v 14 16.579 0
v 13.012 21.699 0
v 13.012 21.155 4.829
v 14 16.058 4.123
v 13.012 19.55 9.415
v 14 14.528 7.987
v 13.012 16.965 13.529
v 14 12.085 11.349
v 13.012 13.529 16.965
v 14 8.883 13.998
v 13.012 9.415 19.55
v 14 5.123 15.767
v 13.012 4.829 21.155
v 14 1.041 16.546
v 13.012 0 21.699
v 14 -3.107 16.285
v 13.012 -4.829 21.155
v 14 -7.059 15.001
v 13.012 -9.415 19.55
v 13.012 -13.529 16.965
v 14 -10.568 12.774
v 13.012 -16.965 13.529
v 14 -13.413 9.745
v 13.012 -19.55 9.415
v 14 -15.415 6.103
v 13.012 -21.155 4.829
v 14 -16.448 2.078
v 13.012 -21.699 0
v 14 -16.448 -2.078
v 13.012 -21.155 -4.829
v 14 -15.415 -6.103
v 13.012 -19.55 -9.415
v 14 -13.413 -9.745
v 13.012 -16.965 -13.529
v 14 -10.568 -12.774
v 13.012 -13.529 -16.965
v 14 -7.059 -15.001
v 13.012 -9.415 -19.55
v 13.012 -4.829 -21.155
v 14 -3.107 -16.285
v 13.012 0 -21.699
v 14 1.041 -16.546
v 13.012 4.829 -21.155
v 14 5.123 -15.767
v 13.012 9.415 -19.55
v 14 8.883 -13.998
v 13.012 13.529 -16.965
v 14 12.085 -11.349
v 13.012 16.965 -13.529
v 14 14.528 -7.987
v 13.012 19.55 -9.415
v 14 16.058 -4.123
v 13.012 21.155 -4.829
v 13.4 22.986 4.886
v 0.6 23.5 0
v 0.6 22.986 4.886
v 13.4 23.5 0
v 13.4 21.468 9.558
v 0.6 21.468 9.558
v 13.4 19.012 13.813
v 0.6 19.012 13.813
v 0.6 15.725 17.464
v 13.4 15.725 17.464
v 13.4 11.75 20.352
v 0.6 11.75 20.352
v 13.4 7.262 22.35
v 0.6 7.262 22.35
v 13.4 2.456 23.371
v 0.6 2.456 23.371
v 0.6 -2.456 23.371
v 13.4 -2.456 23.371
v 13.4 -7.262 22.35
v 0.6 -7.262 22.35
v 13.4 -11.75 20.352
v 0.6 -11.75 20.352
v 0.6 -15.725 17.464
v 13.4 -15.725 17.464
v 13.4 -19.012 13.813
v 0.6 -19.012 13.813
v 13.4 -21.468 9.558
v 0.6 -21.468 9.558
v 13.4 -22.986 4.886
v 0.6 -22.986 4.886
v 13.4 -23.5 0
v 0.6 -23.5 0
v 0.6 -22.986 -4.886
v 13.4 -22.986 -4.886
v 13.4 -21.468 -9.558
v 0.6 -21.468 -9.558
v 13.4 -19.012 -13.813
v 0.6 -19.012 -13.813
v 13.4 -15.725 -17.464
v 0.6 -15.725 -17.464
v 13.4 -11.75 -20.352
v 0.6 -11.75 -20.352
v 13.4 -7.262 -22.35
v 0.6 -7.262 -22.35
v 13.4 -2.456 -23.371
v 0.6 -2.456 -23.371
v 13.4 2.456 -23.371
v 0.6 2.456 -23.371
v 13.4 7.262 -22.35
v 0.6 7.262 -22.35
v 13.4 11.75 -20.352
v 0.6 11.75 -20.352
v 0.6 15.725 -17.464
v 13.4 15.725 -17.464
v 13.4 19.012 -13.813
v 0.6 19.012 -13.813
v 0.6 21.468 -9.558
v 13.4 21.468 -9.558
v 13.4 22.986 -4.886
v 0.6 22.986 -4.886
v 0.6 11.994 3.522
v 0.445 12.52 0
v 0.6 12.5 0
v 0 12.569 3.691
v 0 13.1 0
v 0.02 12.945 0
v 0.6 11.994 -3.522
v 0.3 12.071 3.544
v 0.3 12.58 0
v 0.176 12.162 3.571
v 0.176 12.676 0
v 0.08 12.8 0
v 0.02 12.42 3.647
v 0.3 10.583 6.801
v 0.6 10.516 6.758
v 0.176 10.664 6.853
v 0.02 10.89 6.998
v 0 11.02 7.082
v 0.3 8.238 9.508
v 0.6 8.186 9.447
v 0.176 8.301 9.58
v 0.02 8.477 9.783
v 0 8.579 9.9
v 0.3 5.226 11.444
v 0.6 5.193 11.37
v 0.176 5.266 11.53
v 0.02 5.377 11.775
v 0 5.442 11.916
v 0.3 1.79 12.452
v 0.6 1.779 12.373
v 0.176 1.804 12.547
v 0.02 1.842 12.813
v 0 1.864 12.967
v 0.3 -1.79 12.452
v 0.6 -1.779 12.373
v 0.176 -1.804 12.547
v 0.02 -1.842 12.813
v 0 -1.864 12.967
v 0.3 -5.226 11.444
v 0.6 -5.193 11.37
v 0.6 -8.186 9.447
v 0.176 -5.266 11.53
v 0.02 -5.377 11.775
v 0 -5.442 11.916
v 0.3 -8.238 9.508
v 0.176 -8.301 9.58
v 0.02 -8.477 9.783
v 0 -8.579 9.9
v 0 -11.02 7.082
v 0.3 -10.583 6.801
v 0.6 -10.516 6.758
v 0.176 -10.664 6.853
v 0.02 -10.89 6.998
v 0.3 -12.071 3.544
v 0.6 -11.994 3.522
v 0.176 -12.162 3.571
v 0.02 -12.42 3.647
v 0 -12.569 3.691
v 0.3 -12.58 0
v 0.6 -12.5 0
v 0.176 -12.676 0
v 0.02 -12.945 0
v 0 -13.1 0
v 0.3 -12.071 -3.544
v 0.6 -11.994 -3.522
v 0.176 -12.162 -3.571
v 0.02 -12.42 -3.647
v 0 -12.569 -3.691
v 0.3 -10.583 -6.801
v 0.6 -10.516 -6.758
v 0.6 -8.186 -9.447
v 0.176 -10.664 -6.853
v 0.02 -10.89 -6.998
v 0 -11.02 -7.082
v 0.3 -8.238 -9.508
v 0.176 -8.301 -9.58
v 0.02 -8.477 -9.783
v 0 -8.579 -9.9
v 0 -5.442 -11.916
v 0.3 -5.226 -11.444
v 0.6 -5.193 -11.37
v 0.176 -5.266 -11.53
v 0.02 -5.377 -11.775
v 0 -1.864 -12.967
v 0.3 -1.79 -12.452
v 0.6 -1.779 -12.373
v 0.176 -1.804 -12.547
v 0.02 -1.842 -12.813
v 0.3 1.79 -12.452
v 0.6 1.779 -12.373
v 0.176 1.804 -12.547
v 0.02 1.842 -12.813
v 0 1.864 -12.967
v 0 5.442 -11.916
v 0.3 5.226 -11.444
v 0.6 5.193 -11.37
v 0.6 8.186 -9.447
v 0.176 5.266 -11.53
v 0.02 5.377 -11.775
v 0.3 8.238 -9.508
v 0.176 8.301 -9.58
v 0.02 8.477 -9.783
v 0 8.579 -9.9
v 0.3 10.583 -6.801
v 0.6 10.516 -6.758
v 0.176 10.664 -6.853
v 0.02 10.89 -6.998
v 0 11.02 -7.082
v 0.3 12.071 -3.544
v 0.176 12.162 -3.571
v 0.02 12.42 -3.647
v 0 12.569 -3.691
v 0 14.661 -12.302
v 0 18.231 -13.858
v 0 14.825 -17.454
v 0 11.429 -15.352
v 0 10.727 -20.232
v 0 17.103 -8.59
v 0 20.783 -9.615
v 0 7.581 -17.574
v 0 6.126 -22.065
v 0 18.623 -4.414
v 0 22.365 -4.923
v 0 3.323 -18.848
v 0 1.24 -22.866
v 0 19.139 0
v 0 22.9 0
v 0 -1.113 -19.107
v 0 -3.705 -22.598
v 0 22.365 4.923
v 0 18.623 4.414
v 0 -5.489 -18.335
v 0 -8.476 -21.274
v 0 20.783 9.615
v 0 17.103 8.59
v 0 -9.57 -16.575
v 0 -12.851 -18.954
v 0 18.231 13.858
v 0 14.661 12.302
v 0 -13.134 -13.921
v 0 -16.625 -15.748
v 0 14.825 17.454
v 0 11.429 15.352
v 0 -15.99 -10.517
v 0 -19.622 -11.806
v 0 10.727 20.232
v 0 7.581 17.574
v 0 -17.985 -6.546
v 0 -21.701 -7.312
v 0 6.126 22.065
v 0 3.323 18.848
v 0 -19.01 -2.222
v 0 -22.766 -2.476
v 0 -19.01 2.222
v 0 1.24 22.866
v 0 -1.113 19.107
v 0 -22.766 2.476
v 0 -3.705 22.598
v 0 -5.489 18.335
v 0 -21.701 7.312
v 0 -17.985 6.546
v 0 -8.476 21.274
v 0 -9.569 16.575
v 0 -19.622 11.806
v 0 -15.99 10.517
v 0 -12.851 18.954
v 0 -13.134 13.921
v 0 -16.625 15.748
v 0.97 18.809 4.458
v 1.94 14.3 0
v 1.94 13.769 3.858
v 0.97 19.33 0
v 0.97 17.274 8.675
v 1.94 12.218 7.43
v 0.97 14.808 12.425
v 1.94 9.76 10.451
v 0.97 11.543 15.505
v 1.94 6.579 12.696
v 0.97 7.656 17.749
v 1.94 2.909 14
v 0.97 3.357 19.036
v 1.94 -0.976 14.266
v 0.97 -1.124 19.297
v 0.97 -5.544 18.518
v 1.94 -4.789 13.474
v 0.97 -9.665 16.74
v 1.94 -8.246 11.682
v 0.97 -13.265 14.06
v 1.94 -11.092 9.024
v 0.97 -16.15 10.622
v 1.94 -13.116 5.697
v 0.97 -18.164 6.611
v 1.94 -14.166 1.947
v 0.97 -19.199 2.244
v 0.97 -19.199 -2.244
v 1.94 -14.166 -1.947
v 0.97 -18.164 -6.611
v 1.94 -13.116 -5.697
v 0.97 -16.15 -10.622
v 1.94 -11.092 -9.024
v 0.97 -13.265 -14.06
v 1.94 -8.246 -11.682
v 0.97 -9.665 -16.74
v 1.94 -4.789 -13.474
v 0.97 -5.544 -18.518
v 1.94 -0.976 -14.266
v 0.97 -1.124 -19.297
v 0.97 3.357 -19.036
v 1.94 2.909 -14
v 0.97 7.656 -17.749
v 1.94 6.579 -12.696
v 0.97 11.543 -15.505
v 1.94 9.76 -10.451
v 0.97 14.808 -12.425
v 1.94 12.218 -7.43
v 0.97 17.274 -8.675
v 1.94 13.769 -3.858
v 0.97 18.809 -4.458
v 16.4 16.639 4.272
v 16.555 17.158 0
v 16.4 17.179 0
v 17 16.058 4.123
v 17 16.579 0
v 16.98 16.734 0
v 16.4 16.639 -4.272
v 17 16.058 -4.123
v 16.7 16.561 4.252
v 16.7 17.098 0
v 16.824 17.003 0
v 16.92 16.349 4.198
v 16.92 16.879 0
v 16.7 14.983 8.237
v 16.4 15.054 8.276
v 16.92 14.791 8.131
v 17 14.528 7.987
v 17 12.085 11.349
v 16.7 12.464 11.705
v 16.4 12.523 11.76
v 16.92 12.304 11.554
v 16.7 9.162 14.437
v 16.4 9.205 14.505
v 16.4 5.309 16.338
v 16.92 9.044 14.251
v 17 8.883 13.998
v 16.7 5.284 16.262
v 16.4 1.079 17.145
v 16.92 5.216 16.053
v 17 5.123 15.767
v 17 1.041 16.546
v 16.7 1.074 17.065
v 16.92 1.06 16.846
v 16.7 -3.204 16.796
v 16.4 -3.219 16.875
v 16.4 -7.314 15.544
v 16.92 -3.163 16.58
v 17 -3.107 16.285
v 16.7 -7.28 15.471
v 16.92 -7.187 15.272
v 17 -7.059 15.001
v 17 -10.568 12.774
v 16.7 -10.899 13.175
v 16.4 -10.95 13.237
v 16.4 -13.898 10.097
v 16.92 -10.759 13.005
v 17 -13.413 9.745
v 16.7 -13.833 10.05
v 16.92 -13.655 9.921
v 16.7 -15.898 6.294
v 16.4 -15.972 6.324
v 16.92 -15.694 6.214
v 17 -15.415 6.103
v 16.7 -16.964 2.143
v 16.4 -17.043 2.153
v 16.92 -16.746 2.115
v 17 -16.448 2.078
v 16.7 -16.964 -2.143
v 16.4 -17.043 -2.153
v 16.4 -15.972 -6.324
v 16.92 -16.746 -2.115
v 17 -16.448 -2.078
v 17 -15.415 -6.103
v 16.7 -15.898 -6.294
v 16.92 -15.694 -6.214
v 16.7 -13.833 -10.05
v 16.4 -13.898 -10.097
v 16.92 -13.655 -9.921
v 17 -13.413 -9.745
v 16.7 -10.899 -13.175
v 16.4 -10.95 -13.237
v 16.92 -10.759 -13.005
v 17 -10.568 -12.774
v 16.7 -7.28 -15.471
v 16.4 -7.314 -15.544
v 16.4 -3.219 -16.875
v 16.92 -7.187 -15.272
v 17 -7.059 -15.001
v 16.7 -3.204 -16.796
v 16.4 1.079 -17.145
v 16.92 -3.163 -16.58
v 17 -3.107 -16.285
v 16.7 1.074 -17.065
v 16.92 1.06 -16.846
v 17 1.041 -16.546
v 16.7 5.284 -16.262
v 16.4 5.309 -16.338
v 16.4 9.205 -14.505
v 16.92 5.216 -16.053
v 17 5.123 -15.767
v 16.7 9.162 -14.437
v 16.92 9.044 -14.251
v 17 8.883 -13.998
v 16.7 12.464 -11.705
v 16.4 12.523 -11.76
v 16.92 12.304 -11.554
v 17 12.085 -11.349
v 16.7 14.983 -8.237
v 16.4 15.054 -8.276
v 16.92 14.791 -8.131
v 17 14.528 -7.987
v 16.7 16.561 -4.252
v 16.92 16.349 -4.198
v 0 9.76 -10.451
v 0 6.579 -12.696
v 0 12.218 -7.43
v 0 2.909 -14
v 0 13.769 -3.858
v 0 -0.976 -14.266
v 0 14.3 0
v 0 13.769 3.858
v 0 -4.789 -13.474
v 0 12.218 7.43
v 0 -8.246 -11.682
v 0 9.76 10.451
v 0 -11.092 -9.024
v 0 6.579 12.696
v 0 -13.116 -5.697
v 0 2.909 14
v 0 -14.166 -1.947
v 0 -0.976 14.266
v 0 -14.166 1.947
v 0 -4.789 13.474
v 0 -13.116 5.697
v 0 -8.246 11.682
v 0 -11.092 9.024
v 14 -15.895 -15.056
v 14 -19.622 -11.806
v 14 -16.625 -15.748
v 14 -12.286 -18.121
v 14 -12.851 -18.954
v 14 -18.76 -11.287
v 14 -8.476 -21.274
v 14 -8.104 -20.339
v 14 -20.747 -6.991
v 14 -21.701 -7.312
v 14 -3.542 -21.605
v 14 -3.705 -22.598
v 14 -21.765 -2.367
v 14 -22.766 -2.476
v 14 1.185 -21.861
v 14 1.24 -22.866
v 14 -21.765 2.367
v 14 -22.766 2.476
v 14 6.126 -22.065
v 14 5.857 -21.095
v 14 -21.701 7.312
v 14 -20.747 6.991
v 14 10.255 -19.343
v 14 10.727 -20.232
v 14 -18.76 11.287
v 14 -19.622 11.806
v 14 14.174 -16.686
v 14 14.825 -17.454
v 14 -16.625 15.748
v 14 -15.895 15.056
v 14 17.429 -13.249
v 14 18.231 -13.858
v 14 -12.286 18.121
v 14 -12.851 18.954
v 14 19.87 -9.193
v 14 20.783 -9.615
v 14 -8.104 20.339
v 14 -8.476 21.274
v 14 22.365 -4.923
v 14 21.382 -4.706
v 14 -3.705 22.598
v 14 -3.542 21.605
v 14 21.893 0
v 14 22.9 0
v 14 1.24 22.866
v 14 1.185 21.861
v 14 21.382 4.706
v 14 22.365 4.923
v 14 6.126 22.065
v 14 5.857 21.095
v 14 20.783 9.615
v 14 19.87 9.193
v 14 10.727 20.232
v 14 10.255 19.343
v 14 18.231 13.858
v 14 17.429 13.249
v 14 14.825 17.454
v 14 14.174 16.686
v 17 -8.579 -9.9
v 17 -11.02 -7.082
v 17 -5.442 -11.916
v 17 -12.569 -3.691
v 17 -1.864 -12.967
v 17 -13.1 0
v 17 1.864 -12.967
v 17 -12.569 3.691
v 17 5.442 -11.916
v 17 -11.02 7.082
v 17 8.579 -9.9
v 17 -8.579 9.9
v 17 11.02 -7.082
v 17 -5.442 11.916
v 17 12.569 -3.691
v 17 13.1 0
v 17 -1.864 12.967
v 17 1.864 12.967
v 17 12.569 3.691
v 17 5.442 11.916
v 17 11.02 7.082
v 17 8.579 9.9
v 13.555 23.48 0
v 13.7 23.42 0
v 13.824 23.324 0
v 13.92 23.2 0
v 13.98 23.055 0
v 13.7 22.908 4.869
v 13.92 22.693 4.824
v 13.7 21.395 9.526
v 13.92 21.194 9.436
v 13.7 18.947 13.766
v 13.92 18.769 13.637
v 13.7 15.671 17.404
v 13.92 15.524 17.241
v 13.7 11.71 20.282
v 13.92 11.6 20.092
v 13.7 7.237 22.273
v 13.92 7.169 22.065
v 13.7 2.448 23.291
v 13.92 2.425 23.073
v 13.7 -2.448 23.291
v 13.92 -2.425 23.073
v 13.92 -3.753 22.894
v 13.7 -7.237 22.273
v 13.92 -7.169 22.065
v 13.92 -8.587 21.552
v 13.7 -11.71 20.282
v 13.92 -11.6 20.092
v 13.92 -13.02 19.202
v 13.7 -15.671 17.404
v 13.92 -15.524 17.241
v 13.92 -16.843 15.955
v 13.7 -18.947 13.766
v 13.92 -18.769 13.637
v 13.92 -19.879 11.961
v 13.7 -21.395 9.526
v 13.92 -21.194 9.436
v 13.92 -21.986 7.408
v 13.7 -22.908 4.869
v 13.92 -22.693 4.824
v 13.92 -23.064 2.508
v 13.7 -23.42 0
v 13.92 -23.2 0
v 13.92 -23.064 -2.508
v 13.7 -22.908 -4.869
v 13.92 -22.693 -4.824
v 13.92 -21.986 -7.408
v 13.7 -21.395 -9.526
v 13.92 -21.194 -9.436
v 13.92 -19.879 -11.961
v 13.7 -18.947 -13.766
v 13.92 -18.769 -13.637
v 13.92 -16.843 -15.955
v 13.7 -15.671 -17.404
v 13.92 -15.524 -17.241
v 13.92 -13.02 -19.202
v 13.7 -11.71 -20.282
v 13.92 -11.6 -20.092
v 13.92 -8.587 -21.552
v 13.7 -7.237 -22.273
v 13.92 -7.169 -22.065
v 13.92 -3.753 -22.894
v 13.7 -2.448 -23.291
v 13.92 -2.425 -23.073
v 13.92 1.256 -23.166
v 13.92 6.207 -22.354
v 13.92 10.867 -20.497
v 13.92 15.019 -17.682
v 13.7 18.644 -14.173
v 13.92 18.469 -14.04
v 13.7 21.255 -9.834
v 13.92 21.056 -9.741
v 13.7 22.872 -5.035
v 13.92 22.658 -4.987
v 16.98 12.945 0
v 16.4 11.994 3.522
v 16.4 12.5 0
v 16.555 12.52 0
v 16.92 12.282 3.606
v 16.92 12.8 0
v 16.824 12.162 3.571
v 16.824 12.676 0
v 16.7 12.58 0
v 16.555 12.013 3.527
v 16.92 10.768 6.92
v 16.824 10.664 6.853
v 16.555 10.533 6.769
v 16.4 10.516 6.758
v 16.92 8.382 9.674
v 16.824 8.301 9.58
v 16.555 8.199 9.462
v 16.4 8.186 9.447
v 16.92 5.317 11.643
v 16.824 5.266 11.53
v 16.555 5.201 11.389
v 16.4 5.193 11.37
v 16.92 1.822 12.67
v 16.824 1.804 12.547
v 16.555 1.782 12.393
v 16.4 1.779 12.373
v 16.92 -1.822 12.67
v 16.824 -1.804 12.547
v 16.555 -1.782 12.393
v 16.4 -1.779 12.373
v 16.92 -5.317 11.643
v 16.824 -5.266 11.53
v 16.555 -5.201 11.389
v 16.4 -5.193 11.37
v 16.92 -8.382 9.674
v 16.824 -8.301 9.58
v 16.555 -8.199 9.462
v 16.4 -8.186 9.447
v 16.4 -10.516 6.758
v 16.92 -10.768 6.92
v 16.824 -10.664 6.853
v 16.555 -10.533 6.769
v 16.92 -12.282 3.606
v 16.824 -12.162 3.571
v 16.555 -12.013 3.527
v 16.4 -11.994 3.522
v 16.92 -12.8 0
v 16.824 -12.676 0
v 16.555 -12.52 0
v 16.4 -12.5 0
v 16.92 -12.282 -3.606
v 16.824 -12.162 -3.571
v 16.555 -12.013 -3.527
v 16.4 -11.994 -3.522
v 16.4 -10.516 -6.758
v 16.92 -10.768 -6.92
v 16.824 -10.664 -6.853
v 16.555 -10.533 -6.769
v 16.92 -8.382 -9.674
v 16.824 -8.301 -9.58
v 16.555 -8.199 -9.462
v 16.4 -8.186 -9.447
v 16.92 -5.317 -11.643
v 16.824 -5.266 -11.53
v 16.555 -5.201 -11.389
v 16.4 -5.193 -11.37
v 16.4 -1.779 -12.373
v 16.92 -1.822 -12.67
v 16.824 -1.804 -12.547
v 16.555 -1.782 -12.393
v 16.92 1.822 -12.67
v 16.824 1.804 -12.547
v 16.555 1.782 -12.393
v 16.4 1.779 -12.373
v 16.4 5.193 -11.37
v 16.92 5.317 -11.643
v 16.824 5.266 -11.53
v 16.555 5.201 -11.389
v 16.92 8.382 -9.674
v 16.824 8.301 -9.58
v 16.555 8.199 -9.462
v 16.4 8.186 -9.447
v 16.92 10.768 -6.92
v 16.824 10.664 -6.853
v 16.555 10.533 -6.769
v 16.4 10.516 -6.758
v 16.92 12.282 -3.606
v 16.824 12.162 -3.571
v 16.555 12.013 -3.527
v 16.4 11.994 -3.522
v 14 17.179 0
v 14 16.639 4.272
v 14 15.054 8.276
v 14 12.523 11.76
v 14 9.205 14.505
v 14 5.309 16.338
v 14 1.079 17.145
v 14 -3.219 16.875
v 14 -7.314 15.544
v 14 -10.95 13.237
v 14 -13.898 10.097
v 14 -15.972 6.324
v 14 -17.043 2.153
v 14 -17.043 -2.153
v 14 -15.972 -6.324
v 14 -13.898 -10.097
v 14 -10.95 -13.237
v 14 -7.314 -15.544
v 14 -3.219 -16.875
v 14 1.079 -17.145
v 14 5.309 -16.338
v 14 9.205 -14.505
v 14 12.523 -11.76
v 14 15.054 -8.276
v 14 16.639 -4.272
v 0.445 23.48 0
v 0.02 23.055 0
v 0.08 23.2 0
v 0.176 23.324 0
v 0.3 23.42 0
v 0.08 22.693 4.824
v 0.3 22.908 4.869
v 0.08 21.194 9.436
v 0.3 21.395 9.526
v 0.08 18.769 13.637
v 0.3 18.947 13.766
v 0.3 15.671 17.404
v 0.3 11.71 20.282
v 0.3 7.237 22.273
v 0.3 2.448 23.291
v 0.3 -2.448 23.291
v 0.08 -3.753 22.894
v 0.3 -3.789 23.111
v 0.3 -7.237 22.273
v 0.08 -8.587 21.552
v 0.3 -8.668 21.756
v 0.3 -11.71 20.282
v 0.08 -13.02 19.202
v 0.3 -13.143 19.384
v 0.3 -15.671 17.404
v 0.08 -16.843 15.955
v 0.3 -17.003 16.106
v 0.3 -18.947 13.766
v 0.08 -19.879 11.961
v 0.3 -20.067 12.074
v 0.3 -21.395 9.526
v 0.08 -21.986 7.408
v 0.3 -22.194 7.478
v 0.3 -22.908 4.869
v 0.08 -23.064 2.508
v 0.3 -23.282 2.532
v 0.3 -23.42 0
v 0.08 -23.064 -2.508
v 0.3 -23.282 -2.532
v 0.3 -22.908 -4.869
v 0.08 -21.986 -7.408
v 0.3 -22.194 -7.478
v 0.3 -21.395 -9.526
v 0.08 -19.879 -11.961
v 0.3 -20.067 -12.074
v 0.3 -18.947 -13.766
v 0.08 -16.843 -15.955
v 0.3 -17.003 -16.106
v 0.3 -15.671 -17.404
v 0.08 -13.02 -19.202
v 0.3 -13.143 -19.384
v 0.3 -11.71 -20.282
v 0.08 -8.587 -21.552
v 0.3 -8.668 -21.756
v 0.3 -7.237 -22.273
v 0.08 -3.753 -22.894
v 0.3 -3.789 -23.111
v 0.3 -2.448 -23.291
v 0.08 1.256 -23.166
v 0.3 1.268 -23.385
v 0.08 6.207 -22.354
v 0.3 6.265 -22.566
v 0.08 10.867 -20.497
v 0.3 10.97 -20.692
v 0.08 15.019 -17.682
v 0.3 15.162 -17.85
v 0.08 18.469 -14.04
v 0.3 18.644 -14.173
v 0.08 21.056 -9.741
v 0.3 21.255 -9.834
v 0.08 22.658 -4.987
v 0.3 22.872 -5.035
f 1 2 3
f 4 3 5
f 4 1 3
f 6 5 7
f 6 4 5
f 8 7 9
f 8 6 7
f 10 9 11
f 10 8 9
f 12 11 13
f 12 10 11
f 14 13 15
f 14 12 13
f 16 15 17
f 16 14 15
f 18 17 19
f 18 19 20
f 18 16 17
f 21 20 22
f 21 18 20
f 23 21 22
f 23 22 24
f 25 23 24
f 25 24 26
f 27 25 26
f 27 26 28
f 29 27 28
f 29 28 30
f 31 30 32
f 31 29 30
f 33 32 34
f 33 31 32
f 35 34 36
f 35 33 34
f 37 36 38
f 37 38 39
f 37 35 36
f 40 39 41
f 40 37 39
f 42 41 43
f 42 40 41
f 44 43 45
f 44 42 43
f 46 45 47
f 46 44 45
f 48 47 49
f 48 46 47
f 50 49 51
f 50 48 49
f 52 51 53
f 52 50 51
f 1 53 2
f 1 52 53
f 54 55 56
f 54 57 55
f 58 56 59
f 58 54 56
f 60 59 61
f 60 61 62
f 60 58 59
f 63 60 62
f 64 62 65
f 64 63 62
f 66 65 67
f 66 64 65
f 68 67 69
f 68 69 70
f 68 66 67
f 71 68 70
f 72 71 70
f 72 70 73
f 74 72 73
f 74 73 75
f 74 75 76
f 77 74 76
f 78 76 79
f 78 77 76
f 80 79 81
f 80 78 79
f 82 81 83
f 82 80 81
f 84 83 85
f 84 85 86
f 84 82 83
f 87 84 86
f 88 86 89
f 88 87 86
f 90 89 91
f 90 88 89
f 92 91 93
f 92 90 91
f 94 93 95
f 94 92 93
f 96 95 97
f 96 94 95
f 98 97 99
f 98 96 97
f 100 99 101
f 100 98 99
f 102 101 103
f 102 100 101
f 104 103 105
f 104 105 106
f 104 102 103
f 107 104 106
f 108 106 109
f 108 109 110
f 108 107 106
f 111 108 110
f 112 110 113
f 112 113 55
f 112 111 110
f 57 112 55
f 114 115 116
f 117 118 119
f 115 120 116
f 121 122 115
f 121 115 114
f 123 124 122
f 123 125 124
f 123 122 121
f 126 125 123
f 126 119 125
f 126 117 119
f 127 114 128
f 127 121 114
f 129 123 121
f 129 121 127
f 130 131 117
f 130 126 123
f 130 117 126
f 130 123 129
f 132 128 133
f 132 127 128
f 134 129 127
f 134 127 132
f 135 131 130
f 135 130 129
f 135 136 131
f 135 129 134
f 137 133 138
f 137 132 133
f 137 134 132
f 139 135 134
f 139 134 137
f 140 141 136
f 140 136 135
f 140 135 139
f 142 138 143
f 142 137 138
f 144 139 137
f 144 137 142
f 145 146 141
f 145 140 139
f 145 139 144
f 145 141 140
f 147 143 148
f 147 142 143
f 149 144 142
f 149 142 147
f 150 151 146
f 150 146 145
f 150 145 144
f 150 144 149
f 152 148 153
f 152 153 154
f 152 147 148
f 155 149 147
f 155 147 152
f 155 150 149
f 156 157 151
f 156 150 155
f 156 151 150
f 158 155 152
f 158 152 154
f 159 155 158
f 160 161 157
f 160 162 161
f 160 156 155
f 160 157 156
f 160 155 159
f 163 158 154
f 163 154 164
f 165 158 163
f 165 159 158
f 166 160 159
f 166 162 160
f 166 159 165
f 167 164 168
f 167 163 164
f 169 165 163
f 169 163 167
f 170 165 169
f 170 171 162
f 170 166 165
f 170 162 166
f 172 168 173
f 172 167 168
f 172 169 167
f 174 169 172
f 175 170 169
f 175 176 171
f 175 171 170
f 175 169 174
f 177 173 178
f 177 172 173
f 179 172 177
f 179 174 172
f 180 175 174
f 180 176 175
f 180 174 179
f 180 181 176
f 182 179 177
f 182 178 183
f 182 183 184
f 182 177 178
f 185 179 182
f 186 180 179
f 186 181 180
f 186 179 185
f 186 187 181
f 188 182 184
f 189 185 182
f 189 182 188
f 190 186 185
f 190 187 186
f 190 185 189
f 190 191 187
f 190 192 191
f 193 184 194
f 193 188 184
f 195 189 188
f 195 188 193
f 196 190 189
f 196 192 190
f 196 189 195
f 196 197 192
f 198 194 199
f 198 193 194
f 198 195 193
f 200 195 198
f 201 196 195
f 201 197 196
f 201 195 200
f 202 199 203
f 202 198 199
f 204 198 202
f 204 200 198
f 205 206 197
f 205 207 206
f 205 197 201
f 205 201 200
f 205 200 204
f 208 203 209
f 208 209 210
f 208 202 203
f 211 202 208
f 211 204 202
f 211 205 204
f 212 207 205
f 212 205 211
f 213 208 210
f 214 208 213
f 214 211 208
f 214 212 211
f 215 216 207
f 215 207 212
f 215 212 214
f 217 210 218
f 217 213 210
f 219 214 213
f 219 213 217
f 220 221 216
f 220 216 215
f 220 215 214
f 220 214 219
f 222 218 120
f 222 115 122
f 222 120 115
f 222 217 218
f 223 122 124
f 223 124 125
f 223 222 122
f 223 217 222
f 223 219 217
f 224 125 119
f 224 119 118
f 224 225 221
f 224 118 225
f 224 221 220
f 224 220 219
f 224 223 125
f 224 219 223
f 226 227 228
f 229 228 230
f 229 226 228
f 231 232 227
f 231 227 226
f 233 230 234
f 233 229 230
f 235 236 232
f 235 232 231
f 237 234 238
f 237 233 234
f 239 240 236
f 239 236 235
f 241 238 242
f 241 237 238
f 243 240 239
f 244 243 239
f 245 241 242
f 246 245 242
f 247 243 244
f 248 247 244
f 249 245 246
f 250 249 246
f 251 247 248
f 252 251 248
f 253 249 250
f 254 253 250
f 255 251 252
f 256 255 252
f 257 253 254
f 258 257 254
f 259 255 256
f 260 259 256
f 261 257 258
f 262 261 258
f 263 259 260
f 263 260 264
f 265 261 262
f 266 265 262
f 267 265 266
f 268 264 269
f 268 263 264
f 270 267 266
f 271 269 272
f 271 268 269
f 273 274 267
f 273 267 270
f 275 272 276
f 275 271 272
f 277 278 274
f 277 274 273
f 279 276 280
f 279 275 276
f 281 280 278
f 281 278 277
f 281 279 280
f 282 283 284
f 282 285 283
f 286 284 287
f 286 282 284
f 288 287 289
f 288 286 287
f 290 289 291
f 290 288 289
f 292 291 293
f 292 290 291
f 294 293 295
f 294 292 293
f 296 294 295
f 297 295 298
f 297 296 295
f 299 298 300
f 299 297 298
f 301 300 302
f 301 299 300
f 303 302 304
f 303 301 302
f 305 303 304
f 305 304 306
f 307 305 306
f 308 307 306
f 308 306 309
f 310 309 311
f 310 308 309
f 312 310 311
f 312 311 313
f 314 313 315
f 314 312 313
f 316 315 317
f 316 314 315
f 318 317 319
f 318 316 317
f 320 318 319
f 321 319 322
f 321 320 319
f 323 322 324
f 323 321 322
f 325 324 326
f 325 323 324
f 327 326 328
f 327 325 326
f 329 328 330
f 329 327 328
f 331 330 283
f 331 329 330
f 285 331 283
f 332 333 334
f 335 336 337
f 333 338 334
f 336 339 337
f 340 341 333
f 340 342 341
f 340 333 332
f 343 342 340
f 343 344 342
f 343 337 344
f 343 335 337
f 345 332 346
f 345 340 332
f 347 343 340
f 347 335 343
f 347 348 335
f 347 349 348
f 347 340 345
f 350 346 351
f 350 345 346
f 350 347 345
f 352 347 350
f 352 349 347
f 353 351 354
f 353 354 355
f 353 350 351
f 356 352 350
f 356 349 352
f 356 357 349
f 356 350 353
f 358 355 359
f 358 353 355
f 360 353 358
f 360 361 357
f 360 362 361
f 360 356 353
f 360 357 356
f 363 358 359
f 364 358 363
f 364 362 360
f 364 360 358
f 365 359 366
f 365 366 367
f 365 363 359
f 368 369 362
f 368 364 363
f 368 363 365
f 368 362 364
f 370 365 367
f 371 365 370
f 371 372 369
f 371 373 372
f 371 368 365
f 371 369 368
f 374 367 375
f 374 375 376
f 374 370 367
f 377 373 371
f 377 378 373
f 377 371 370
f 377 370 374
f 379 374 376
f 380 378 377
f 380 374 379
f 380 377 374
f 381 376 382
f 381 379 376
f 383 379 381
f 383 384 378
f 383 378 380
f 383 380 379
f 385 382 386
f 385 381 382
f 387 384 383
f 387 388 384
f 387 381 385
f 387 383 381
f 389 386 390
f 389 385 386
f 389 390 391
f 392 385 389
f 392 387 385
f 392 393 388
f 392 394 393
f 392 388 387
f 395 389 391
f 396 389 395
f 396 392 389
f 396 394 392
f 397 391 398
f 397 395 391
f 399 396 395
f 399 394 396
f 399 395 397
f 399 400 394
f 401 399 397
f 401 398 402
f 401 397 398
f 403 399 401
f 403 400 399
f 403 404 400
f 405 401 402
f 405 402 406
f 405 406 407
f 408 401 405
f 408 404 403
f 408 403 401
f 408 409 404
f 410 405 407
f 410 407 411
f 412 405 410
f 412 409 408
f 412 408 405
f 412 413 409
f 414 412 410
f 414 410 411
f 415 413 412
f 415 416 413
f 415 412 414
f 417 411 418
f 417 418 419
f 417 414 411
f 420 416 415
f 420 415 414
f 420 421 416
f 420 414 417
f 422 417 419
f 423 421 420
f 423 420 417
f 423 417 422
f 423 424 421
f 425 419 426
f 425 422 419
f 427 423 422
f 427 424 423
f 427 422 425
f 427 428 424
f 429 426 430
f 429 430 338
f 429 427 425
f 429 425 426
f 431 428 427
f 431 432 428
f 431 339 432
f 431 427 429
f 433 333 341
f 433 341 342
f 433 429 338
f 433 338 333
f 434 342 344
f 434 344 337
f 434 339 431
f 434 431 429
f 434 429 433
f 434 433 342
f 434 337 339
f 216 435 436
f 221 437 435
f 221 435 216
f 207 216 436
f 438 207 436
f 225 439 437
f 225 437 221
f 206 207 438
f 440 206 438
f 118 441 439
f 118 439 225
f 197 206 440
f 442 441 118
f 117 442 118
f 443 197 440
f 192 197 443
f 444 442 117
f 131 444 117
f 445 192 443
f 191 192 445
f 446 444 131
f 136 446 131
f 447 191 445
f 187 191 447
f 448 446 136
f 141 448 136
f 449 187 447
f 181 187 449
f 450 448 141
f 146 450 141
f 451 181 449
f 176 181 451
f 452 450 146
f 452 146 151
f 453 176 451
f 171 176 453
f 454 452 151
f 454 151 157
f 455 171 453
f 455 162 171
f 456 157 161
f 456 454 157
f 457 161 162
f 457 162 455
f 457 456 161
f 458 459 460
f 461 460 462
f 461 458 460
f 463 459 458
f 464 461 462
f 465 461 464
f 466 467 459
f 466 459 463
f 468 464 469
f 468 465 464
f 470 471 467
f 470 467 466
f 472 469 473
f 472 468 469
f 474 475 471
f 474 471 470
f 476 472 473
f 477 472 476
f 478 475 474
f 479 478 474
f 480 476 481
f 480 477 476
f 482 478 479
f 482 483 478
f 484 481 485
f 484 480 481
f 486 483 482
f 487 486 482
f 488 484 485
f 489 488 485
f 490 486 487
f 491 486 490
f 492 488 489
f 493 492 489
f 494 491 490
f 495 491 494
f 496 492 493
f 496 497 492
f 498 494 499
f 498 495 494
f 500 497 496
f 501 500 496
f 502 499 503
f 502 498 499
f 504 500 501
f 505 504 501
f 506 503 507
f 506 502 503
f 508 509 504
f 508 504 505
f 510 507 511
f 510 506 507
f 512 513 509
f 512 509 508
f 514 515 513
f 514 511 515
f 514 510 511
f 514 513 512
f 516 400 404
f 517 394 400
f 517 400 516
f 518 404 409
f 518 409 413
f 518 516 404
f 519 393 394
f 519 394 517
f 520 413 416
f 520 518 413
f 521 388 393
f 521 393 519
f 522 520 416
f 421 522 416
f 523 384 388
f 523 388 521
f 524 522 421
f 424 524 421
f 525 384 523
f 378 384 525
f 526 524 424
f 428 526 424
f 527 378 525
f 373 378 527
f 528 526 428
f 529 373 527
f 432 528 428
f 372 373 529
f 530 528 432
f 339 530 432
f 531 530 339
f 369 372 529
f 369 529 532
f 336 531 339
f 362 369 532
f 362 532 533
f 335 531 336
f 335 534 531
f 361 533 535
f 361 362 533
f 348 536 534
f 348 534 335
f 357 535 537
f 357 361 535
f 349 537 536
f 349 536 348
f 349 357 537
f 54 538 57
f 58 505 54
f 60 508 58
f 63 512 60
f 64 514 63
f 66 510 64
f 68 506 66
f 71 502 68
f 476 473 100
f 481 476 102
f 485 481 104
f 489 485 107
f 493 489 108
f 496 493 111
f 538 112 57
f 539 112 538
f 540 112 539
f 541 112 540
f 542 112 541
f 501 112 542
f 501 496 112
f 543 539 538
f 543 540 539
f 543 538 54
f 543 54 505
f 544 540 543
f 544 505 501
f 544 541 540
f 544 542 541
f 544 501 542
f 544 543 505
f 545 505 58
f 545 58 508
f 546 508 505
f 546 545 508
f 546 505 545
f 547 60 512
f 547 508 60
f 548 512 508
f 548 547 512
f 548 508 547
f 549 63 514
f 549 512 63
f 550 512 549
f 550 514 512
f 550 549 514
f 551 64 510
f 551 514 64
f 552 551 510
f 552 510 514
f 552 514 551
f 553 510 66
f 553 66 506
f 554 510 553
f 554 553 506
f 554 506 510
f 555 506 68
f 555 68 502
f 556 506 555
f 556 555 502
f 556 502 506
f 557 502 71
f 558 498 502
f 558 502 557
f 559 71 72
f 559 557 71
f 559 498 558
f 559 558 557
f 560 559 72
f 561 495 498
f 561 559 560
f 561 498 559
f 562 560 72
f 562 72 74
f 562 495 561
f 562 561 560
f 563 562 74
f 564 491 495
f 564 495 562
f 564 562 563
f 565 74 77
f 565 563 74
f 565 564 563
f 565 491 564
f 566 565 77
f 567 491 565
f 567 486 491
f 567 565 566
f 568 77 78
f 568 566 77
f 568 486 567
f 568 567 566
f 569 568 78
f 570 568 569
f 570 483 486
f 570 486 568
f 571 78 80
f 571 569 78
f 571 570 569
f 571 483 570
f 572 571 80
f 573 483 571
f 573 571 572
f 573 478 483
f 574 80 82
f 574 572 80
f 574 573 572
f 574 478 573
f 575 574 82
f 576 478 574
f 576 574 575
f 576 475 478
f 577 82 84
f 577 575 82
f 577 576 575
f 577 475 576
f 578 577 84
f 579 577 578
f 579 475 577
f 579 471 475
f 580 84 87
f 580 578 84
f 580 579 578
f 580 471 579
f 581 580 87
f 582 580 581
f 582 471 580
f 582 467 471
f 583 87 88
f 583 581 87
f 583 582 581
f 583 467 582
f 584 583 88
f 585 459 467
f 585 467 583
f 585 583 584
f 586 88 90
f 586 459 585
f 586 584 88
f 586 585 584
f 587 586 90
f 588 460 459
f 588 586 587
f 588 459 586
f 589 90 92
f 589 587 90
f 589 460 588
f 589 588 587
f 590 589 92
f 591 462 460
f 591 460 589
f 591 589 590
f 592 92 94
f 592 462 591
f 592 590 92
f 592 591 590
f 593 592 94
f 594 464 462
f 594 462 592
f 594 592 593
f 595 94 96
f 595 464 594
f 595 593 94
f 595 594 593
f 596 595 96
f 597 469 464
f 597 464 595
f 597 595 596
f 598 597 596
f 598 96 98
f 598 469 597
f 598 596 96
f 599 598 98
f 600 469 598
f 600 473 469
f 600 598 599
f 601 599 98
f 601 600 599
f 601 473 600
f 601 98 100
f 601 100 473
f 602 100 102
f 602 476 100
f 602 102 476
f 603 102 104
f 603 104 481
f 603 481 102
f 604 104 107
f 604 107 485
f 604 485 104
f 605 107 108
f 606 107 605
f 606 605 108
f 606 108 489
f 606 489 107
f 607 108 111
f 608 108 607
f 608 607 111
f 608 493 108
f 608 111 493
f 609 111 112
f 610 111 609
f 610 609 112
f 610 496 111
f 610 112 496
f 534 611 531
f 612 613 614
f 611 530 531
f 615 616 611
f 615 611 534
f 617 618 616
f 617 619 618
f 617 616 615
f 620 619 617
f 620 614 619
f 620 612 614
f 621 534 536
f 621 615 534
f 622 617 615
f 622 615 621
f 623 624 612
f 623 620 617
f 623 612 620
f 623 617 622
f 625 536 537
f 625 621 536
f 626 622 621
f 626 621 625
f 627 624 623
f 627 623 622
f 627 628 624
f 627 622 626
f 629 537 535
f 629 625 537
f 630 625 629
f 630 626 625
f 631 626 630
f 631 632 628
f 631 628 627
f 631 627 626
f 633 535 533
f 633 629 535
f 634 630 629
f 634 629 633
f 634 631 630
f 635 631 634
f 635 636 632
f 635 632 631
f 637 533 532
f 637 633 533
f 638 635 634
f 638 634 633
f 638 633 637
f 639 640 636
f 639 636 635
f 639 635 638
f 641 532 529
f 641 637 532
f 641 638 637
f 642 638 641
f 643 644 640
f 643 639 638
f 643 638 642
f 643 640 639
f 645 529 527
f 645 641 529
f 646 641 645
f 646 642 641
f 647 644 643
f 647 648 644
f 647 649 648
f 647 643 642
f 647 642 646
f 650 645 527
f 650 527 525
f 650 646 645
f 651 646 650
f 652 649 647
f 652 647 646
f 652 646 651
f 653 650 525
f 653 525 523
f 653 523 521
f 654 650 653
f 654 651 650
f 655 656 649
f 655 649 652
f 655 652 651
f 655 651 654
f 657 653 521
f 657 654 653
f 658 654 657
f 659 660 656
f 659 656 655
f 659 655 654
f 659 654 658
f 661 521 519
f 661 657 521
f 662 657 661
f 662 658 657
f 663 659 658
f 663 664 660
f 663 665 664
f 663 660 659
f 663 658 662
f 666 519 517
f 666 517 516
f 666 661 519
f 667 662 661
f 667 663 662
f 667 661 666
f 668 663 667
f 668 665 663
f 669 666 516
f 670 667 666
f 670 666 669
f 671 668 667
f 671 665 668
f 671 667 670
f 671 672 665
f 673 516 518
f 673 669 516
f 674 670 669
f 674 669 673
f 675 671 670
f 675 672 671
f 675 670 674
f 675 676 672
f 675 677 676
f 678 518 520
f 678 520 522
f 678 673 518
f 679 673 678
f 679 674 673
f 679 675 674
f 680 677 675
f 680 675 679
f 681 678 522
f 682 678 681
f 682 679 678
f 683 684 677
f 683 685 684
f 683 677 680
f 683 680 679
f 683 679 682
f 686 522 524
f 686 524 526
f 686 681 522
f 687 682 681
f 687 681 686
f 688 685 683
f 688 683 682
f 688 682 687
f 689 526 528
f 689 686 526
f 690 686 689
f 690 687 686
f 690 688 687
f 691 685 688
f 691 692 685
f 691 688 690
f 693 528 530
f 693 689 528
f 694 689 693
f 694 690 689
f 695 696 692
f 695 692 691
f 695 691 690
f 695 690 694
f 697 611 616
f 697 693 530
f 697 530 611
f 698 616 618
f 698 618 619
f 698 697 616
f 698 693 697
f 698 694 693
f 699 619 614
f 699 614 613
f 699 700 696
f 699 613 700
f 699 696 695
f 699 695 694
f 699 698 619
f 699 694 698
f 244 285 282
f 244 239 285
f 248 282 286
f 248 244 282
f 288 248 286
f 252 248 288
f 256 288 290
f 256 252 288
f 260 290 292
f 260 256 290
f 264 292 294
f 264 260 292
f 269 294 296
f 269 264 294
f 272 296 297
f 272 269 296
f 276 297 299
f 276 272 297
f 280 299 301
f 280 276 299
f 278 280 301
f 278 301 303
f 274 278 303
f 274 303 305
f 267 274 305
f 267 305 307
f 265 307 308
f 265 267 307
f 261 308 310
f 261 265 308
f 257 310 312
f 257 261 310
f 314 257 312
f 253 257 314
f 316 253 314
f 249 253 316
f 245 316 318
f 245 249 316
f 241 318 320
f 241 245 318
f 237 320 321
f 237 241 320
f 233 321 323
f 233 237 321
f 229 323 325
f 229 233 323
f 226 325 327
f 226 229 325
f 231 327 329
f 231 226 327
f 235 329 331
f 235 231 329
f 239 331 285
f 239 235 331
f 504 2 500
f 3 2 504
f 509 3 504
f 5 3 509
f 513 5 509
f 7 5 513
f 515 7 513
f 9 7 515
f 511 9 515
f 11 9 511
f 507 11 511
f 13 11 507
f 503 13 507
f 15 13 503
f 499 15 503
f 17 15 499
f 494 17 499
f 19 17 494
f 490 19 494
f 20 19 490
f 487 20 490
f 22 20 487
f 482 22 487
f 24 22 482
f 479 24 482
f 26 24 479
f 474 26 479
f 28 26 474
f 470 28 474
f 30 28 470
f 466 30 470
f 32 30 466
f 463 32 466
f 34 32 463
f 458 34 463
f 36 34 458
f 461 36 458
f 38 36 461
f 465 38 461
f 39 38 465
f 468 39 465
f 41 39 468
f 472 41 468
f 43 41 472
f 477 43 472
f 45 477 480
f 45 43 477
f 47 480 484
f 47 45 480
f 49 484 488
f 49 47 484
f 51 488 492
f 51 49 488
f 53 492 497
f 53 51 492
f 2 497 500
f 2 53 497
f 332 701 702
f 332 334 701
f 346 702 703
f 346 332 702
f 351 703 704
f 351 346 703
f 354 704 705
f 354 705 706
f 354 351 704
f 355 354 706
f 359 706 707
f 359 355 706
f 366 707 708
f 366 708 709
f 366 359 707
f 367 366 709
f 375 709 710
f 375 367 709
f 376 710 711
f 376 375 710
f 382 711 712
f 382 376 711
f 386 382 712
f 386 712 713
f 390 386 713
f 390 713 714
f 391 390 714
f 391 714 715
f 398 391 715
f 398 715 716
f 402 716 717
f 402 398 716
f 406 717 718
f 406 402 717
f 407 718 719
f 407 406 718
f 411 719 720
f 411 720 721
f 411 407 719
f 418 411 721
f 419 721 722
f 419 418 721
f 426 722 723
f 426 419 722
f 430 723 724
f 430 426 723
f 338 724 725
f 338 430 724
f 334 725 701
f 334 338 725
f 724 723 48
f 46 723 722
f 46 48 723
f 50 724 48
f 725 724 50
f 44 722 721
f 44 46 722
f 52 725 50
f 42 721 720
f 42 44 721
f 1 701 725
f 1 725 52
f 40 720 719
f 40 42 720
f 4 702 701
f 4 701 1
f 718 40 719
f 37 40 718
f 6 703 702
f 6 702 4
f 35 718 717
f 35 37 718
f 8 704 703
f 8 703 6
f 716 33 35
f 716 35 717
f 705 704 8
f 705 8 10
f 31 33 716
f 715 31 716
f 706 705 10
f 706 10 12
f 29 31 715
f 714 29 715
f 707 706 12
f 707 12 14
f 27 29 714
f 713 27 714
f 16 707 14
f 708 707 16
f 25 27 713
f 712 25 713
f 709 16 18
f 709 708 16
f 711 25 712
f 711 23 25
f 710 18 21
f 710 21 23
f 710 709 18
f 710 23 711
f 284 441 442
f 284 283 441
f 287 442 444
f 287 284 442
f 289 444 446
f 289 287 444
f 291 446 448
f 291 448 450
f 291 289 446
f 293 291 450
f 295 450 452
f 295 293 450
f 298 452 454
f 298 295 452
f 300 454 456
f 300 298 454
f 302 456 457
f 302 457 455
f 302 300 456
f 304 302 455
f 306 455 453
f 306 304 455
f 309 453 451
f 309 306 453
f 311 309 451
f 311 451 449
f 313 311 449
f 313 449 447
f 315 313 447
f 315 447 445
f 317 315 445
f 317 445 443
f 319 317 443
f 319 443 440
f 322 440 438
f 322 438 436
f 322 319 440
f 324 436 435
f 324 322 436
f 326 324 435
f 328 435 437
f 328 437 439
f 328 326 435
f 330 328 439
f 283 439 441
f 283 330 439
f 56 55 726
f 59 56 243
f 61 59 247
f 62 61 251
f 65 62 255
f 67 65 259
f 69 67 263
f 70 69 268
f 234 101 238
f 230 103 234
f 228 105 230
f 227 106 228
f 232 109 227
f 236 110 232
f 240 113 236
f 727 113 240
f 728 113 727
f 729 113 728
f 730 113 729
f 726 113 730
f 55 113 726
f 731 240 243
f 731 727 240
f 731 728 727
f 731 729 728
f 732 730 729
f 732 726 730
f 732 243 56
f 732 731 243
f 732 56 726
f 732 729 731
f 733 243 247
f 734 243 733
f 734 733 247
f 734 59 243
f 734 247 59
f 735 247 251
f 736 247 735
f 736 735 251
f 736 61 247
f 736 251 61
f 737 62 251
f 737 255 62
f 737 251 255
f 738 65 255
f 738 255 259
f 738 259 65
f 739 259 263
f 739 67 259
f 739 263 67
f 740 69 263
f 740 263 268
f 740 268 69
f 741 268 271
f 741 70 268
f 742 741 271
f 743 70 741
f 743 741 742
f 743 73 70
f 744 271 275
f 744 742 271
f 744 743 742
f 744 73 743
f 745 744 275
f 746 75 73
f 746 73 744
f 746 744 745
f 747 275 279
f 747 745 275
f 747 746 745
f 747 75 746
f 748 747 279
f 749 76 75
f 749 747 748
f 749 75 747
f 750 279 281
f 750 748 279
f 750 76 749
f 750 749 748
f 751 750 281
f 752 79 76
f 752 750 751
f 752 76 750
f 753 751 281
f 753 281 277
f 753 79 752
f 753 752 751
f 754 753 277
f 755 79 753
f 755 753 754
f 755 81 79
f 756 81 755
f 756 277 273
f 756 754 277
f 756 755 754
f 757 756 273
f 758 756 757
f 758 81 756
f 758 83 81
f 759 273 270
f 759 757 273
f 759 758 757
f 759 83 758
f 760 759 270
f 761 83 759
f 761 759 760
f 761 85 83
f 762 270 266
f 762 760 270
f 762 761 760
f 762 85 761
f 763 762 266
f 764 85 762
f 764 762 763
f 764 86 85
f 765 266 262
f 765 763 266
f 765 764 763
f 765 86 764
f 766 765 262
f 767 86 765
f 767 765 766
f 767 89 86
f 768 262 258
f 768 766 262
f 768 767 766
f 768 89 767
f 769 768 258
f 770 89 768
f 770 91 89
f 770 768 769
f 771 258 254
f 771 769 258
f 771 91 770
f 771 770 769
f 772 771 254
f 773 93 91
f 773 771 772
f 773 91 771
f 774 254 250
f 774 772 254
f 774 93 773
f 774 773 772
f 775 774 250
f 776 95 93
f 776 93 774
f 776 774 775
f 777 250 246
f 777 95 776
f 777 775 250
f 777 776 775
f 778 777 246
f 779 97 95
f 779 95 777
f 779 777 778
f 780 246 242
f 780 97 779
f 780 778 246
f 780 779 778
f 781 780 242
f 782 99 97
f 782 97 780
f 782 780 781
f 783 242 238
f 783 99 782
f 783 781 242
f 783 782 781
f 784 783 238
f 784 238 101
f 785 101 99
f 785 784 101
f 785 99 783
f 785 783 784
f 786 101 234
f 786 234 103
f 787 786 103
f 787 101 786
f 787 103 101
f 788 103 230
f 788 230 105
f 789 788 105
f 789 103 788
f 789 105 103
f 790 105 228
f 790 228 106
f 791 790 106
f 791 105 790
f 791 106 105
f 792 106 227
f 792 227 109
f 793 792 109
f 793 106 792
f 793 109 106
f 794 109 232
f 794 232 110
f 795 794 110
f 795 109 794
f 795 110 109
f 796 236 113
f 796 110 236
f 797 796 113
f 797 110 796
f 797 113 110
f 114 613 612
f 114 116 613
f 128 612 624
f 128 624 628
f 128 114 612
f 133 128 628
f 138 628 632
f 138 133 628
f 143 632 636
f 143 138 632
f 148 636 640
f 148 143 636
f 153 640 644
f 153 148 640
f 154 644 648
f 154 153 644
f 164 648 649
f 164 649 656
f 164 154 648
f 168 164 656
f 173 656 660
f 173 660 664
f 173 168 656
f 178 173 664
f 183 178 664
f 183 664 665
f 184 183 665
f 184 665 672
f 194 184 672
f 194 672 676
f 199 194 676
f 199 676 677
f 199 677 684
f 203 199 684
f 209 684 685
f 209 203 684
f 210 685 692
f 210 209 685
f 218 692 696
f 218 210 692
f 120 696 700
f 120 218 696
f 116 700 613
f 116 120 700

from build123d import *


with BuildPart() as part:
    # Эскиз1 → Повернуть1 (revolve)
    with BuildSketch(Plane.XY):
        with BuildLine():
            Line((0.970205183, 19.32988738), (0, 19.139))
            Line((0, 19.139), (0, 22.9))
            ThreePointArc((0, 22.9), (0.175735931, 23.324264069), (0.6, 23.5))
            Line((0.6, 23.5), (13.4, 23.5))
            ThreePointArc((13.4, 23.5), (13.824264069, 23.324264069), (14, 22.9))
            Line((14, 22.9), (14, 21.893492934))
            Line((14, 21.893492934), (13.012426118, 21.699188271))
            Line((13.012426118, 21.699188271), (14, 16.578811729))
            Line((14, 16.578811729), (14, 17.178811729))
            Line((14, 17.178811729), (16.4, 17.178811729))
            ThreePointArc((16.4, 17.178811729), (16.824264069, 17.003075798), (17, 16.578811729))
            Line((17, 16.578811729), (17, 13.1))
            ThreePointArc((17, 13.1), (16.824264069, 12.675735931), (16.4, 12.5))
            Line((16.4, 12.5), (0.6, 12.5))
            ThreePointArc((0.6, 12.5), (0.175735931, 12.675735931), (0, 13.1))
            Line((0, 13.1), (0, 14.299564132))
            Line((0, 14.299564132), (1.940410366, 14.299564132))
            Line((1.940410366, 14.299564132), (0.970205183, 19.32988738))
        make_face()
    revolve(axis=Axis((-882.527700014, 0, 0), (1, 0, 0)))


solid = part.part
